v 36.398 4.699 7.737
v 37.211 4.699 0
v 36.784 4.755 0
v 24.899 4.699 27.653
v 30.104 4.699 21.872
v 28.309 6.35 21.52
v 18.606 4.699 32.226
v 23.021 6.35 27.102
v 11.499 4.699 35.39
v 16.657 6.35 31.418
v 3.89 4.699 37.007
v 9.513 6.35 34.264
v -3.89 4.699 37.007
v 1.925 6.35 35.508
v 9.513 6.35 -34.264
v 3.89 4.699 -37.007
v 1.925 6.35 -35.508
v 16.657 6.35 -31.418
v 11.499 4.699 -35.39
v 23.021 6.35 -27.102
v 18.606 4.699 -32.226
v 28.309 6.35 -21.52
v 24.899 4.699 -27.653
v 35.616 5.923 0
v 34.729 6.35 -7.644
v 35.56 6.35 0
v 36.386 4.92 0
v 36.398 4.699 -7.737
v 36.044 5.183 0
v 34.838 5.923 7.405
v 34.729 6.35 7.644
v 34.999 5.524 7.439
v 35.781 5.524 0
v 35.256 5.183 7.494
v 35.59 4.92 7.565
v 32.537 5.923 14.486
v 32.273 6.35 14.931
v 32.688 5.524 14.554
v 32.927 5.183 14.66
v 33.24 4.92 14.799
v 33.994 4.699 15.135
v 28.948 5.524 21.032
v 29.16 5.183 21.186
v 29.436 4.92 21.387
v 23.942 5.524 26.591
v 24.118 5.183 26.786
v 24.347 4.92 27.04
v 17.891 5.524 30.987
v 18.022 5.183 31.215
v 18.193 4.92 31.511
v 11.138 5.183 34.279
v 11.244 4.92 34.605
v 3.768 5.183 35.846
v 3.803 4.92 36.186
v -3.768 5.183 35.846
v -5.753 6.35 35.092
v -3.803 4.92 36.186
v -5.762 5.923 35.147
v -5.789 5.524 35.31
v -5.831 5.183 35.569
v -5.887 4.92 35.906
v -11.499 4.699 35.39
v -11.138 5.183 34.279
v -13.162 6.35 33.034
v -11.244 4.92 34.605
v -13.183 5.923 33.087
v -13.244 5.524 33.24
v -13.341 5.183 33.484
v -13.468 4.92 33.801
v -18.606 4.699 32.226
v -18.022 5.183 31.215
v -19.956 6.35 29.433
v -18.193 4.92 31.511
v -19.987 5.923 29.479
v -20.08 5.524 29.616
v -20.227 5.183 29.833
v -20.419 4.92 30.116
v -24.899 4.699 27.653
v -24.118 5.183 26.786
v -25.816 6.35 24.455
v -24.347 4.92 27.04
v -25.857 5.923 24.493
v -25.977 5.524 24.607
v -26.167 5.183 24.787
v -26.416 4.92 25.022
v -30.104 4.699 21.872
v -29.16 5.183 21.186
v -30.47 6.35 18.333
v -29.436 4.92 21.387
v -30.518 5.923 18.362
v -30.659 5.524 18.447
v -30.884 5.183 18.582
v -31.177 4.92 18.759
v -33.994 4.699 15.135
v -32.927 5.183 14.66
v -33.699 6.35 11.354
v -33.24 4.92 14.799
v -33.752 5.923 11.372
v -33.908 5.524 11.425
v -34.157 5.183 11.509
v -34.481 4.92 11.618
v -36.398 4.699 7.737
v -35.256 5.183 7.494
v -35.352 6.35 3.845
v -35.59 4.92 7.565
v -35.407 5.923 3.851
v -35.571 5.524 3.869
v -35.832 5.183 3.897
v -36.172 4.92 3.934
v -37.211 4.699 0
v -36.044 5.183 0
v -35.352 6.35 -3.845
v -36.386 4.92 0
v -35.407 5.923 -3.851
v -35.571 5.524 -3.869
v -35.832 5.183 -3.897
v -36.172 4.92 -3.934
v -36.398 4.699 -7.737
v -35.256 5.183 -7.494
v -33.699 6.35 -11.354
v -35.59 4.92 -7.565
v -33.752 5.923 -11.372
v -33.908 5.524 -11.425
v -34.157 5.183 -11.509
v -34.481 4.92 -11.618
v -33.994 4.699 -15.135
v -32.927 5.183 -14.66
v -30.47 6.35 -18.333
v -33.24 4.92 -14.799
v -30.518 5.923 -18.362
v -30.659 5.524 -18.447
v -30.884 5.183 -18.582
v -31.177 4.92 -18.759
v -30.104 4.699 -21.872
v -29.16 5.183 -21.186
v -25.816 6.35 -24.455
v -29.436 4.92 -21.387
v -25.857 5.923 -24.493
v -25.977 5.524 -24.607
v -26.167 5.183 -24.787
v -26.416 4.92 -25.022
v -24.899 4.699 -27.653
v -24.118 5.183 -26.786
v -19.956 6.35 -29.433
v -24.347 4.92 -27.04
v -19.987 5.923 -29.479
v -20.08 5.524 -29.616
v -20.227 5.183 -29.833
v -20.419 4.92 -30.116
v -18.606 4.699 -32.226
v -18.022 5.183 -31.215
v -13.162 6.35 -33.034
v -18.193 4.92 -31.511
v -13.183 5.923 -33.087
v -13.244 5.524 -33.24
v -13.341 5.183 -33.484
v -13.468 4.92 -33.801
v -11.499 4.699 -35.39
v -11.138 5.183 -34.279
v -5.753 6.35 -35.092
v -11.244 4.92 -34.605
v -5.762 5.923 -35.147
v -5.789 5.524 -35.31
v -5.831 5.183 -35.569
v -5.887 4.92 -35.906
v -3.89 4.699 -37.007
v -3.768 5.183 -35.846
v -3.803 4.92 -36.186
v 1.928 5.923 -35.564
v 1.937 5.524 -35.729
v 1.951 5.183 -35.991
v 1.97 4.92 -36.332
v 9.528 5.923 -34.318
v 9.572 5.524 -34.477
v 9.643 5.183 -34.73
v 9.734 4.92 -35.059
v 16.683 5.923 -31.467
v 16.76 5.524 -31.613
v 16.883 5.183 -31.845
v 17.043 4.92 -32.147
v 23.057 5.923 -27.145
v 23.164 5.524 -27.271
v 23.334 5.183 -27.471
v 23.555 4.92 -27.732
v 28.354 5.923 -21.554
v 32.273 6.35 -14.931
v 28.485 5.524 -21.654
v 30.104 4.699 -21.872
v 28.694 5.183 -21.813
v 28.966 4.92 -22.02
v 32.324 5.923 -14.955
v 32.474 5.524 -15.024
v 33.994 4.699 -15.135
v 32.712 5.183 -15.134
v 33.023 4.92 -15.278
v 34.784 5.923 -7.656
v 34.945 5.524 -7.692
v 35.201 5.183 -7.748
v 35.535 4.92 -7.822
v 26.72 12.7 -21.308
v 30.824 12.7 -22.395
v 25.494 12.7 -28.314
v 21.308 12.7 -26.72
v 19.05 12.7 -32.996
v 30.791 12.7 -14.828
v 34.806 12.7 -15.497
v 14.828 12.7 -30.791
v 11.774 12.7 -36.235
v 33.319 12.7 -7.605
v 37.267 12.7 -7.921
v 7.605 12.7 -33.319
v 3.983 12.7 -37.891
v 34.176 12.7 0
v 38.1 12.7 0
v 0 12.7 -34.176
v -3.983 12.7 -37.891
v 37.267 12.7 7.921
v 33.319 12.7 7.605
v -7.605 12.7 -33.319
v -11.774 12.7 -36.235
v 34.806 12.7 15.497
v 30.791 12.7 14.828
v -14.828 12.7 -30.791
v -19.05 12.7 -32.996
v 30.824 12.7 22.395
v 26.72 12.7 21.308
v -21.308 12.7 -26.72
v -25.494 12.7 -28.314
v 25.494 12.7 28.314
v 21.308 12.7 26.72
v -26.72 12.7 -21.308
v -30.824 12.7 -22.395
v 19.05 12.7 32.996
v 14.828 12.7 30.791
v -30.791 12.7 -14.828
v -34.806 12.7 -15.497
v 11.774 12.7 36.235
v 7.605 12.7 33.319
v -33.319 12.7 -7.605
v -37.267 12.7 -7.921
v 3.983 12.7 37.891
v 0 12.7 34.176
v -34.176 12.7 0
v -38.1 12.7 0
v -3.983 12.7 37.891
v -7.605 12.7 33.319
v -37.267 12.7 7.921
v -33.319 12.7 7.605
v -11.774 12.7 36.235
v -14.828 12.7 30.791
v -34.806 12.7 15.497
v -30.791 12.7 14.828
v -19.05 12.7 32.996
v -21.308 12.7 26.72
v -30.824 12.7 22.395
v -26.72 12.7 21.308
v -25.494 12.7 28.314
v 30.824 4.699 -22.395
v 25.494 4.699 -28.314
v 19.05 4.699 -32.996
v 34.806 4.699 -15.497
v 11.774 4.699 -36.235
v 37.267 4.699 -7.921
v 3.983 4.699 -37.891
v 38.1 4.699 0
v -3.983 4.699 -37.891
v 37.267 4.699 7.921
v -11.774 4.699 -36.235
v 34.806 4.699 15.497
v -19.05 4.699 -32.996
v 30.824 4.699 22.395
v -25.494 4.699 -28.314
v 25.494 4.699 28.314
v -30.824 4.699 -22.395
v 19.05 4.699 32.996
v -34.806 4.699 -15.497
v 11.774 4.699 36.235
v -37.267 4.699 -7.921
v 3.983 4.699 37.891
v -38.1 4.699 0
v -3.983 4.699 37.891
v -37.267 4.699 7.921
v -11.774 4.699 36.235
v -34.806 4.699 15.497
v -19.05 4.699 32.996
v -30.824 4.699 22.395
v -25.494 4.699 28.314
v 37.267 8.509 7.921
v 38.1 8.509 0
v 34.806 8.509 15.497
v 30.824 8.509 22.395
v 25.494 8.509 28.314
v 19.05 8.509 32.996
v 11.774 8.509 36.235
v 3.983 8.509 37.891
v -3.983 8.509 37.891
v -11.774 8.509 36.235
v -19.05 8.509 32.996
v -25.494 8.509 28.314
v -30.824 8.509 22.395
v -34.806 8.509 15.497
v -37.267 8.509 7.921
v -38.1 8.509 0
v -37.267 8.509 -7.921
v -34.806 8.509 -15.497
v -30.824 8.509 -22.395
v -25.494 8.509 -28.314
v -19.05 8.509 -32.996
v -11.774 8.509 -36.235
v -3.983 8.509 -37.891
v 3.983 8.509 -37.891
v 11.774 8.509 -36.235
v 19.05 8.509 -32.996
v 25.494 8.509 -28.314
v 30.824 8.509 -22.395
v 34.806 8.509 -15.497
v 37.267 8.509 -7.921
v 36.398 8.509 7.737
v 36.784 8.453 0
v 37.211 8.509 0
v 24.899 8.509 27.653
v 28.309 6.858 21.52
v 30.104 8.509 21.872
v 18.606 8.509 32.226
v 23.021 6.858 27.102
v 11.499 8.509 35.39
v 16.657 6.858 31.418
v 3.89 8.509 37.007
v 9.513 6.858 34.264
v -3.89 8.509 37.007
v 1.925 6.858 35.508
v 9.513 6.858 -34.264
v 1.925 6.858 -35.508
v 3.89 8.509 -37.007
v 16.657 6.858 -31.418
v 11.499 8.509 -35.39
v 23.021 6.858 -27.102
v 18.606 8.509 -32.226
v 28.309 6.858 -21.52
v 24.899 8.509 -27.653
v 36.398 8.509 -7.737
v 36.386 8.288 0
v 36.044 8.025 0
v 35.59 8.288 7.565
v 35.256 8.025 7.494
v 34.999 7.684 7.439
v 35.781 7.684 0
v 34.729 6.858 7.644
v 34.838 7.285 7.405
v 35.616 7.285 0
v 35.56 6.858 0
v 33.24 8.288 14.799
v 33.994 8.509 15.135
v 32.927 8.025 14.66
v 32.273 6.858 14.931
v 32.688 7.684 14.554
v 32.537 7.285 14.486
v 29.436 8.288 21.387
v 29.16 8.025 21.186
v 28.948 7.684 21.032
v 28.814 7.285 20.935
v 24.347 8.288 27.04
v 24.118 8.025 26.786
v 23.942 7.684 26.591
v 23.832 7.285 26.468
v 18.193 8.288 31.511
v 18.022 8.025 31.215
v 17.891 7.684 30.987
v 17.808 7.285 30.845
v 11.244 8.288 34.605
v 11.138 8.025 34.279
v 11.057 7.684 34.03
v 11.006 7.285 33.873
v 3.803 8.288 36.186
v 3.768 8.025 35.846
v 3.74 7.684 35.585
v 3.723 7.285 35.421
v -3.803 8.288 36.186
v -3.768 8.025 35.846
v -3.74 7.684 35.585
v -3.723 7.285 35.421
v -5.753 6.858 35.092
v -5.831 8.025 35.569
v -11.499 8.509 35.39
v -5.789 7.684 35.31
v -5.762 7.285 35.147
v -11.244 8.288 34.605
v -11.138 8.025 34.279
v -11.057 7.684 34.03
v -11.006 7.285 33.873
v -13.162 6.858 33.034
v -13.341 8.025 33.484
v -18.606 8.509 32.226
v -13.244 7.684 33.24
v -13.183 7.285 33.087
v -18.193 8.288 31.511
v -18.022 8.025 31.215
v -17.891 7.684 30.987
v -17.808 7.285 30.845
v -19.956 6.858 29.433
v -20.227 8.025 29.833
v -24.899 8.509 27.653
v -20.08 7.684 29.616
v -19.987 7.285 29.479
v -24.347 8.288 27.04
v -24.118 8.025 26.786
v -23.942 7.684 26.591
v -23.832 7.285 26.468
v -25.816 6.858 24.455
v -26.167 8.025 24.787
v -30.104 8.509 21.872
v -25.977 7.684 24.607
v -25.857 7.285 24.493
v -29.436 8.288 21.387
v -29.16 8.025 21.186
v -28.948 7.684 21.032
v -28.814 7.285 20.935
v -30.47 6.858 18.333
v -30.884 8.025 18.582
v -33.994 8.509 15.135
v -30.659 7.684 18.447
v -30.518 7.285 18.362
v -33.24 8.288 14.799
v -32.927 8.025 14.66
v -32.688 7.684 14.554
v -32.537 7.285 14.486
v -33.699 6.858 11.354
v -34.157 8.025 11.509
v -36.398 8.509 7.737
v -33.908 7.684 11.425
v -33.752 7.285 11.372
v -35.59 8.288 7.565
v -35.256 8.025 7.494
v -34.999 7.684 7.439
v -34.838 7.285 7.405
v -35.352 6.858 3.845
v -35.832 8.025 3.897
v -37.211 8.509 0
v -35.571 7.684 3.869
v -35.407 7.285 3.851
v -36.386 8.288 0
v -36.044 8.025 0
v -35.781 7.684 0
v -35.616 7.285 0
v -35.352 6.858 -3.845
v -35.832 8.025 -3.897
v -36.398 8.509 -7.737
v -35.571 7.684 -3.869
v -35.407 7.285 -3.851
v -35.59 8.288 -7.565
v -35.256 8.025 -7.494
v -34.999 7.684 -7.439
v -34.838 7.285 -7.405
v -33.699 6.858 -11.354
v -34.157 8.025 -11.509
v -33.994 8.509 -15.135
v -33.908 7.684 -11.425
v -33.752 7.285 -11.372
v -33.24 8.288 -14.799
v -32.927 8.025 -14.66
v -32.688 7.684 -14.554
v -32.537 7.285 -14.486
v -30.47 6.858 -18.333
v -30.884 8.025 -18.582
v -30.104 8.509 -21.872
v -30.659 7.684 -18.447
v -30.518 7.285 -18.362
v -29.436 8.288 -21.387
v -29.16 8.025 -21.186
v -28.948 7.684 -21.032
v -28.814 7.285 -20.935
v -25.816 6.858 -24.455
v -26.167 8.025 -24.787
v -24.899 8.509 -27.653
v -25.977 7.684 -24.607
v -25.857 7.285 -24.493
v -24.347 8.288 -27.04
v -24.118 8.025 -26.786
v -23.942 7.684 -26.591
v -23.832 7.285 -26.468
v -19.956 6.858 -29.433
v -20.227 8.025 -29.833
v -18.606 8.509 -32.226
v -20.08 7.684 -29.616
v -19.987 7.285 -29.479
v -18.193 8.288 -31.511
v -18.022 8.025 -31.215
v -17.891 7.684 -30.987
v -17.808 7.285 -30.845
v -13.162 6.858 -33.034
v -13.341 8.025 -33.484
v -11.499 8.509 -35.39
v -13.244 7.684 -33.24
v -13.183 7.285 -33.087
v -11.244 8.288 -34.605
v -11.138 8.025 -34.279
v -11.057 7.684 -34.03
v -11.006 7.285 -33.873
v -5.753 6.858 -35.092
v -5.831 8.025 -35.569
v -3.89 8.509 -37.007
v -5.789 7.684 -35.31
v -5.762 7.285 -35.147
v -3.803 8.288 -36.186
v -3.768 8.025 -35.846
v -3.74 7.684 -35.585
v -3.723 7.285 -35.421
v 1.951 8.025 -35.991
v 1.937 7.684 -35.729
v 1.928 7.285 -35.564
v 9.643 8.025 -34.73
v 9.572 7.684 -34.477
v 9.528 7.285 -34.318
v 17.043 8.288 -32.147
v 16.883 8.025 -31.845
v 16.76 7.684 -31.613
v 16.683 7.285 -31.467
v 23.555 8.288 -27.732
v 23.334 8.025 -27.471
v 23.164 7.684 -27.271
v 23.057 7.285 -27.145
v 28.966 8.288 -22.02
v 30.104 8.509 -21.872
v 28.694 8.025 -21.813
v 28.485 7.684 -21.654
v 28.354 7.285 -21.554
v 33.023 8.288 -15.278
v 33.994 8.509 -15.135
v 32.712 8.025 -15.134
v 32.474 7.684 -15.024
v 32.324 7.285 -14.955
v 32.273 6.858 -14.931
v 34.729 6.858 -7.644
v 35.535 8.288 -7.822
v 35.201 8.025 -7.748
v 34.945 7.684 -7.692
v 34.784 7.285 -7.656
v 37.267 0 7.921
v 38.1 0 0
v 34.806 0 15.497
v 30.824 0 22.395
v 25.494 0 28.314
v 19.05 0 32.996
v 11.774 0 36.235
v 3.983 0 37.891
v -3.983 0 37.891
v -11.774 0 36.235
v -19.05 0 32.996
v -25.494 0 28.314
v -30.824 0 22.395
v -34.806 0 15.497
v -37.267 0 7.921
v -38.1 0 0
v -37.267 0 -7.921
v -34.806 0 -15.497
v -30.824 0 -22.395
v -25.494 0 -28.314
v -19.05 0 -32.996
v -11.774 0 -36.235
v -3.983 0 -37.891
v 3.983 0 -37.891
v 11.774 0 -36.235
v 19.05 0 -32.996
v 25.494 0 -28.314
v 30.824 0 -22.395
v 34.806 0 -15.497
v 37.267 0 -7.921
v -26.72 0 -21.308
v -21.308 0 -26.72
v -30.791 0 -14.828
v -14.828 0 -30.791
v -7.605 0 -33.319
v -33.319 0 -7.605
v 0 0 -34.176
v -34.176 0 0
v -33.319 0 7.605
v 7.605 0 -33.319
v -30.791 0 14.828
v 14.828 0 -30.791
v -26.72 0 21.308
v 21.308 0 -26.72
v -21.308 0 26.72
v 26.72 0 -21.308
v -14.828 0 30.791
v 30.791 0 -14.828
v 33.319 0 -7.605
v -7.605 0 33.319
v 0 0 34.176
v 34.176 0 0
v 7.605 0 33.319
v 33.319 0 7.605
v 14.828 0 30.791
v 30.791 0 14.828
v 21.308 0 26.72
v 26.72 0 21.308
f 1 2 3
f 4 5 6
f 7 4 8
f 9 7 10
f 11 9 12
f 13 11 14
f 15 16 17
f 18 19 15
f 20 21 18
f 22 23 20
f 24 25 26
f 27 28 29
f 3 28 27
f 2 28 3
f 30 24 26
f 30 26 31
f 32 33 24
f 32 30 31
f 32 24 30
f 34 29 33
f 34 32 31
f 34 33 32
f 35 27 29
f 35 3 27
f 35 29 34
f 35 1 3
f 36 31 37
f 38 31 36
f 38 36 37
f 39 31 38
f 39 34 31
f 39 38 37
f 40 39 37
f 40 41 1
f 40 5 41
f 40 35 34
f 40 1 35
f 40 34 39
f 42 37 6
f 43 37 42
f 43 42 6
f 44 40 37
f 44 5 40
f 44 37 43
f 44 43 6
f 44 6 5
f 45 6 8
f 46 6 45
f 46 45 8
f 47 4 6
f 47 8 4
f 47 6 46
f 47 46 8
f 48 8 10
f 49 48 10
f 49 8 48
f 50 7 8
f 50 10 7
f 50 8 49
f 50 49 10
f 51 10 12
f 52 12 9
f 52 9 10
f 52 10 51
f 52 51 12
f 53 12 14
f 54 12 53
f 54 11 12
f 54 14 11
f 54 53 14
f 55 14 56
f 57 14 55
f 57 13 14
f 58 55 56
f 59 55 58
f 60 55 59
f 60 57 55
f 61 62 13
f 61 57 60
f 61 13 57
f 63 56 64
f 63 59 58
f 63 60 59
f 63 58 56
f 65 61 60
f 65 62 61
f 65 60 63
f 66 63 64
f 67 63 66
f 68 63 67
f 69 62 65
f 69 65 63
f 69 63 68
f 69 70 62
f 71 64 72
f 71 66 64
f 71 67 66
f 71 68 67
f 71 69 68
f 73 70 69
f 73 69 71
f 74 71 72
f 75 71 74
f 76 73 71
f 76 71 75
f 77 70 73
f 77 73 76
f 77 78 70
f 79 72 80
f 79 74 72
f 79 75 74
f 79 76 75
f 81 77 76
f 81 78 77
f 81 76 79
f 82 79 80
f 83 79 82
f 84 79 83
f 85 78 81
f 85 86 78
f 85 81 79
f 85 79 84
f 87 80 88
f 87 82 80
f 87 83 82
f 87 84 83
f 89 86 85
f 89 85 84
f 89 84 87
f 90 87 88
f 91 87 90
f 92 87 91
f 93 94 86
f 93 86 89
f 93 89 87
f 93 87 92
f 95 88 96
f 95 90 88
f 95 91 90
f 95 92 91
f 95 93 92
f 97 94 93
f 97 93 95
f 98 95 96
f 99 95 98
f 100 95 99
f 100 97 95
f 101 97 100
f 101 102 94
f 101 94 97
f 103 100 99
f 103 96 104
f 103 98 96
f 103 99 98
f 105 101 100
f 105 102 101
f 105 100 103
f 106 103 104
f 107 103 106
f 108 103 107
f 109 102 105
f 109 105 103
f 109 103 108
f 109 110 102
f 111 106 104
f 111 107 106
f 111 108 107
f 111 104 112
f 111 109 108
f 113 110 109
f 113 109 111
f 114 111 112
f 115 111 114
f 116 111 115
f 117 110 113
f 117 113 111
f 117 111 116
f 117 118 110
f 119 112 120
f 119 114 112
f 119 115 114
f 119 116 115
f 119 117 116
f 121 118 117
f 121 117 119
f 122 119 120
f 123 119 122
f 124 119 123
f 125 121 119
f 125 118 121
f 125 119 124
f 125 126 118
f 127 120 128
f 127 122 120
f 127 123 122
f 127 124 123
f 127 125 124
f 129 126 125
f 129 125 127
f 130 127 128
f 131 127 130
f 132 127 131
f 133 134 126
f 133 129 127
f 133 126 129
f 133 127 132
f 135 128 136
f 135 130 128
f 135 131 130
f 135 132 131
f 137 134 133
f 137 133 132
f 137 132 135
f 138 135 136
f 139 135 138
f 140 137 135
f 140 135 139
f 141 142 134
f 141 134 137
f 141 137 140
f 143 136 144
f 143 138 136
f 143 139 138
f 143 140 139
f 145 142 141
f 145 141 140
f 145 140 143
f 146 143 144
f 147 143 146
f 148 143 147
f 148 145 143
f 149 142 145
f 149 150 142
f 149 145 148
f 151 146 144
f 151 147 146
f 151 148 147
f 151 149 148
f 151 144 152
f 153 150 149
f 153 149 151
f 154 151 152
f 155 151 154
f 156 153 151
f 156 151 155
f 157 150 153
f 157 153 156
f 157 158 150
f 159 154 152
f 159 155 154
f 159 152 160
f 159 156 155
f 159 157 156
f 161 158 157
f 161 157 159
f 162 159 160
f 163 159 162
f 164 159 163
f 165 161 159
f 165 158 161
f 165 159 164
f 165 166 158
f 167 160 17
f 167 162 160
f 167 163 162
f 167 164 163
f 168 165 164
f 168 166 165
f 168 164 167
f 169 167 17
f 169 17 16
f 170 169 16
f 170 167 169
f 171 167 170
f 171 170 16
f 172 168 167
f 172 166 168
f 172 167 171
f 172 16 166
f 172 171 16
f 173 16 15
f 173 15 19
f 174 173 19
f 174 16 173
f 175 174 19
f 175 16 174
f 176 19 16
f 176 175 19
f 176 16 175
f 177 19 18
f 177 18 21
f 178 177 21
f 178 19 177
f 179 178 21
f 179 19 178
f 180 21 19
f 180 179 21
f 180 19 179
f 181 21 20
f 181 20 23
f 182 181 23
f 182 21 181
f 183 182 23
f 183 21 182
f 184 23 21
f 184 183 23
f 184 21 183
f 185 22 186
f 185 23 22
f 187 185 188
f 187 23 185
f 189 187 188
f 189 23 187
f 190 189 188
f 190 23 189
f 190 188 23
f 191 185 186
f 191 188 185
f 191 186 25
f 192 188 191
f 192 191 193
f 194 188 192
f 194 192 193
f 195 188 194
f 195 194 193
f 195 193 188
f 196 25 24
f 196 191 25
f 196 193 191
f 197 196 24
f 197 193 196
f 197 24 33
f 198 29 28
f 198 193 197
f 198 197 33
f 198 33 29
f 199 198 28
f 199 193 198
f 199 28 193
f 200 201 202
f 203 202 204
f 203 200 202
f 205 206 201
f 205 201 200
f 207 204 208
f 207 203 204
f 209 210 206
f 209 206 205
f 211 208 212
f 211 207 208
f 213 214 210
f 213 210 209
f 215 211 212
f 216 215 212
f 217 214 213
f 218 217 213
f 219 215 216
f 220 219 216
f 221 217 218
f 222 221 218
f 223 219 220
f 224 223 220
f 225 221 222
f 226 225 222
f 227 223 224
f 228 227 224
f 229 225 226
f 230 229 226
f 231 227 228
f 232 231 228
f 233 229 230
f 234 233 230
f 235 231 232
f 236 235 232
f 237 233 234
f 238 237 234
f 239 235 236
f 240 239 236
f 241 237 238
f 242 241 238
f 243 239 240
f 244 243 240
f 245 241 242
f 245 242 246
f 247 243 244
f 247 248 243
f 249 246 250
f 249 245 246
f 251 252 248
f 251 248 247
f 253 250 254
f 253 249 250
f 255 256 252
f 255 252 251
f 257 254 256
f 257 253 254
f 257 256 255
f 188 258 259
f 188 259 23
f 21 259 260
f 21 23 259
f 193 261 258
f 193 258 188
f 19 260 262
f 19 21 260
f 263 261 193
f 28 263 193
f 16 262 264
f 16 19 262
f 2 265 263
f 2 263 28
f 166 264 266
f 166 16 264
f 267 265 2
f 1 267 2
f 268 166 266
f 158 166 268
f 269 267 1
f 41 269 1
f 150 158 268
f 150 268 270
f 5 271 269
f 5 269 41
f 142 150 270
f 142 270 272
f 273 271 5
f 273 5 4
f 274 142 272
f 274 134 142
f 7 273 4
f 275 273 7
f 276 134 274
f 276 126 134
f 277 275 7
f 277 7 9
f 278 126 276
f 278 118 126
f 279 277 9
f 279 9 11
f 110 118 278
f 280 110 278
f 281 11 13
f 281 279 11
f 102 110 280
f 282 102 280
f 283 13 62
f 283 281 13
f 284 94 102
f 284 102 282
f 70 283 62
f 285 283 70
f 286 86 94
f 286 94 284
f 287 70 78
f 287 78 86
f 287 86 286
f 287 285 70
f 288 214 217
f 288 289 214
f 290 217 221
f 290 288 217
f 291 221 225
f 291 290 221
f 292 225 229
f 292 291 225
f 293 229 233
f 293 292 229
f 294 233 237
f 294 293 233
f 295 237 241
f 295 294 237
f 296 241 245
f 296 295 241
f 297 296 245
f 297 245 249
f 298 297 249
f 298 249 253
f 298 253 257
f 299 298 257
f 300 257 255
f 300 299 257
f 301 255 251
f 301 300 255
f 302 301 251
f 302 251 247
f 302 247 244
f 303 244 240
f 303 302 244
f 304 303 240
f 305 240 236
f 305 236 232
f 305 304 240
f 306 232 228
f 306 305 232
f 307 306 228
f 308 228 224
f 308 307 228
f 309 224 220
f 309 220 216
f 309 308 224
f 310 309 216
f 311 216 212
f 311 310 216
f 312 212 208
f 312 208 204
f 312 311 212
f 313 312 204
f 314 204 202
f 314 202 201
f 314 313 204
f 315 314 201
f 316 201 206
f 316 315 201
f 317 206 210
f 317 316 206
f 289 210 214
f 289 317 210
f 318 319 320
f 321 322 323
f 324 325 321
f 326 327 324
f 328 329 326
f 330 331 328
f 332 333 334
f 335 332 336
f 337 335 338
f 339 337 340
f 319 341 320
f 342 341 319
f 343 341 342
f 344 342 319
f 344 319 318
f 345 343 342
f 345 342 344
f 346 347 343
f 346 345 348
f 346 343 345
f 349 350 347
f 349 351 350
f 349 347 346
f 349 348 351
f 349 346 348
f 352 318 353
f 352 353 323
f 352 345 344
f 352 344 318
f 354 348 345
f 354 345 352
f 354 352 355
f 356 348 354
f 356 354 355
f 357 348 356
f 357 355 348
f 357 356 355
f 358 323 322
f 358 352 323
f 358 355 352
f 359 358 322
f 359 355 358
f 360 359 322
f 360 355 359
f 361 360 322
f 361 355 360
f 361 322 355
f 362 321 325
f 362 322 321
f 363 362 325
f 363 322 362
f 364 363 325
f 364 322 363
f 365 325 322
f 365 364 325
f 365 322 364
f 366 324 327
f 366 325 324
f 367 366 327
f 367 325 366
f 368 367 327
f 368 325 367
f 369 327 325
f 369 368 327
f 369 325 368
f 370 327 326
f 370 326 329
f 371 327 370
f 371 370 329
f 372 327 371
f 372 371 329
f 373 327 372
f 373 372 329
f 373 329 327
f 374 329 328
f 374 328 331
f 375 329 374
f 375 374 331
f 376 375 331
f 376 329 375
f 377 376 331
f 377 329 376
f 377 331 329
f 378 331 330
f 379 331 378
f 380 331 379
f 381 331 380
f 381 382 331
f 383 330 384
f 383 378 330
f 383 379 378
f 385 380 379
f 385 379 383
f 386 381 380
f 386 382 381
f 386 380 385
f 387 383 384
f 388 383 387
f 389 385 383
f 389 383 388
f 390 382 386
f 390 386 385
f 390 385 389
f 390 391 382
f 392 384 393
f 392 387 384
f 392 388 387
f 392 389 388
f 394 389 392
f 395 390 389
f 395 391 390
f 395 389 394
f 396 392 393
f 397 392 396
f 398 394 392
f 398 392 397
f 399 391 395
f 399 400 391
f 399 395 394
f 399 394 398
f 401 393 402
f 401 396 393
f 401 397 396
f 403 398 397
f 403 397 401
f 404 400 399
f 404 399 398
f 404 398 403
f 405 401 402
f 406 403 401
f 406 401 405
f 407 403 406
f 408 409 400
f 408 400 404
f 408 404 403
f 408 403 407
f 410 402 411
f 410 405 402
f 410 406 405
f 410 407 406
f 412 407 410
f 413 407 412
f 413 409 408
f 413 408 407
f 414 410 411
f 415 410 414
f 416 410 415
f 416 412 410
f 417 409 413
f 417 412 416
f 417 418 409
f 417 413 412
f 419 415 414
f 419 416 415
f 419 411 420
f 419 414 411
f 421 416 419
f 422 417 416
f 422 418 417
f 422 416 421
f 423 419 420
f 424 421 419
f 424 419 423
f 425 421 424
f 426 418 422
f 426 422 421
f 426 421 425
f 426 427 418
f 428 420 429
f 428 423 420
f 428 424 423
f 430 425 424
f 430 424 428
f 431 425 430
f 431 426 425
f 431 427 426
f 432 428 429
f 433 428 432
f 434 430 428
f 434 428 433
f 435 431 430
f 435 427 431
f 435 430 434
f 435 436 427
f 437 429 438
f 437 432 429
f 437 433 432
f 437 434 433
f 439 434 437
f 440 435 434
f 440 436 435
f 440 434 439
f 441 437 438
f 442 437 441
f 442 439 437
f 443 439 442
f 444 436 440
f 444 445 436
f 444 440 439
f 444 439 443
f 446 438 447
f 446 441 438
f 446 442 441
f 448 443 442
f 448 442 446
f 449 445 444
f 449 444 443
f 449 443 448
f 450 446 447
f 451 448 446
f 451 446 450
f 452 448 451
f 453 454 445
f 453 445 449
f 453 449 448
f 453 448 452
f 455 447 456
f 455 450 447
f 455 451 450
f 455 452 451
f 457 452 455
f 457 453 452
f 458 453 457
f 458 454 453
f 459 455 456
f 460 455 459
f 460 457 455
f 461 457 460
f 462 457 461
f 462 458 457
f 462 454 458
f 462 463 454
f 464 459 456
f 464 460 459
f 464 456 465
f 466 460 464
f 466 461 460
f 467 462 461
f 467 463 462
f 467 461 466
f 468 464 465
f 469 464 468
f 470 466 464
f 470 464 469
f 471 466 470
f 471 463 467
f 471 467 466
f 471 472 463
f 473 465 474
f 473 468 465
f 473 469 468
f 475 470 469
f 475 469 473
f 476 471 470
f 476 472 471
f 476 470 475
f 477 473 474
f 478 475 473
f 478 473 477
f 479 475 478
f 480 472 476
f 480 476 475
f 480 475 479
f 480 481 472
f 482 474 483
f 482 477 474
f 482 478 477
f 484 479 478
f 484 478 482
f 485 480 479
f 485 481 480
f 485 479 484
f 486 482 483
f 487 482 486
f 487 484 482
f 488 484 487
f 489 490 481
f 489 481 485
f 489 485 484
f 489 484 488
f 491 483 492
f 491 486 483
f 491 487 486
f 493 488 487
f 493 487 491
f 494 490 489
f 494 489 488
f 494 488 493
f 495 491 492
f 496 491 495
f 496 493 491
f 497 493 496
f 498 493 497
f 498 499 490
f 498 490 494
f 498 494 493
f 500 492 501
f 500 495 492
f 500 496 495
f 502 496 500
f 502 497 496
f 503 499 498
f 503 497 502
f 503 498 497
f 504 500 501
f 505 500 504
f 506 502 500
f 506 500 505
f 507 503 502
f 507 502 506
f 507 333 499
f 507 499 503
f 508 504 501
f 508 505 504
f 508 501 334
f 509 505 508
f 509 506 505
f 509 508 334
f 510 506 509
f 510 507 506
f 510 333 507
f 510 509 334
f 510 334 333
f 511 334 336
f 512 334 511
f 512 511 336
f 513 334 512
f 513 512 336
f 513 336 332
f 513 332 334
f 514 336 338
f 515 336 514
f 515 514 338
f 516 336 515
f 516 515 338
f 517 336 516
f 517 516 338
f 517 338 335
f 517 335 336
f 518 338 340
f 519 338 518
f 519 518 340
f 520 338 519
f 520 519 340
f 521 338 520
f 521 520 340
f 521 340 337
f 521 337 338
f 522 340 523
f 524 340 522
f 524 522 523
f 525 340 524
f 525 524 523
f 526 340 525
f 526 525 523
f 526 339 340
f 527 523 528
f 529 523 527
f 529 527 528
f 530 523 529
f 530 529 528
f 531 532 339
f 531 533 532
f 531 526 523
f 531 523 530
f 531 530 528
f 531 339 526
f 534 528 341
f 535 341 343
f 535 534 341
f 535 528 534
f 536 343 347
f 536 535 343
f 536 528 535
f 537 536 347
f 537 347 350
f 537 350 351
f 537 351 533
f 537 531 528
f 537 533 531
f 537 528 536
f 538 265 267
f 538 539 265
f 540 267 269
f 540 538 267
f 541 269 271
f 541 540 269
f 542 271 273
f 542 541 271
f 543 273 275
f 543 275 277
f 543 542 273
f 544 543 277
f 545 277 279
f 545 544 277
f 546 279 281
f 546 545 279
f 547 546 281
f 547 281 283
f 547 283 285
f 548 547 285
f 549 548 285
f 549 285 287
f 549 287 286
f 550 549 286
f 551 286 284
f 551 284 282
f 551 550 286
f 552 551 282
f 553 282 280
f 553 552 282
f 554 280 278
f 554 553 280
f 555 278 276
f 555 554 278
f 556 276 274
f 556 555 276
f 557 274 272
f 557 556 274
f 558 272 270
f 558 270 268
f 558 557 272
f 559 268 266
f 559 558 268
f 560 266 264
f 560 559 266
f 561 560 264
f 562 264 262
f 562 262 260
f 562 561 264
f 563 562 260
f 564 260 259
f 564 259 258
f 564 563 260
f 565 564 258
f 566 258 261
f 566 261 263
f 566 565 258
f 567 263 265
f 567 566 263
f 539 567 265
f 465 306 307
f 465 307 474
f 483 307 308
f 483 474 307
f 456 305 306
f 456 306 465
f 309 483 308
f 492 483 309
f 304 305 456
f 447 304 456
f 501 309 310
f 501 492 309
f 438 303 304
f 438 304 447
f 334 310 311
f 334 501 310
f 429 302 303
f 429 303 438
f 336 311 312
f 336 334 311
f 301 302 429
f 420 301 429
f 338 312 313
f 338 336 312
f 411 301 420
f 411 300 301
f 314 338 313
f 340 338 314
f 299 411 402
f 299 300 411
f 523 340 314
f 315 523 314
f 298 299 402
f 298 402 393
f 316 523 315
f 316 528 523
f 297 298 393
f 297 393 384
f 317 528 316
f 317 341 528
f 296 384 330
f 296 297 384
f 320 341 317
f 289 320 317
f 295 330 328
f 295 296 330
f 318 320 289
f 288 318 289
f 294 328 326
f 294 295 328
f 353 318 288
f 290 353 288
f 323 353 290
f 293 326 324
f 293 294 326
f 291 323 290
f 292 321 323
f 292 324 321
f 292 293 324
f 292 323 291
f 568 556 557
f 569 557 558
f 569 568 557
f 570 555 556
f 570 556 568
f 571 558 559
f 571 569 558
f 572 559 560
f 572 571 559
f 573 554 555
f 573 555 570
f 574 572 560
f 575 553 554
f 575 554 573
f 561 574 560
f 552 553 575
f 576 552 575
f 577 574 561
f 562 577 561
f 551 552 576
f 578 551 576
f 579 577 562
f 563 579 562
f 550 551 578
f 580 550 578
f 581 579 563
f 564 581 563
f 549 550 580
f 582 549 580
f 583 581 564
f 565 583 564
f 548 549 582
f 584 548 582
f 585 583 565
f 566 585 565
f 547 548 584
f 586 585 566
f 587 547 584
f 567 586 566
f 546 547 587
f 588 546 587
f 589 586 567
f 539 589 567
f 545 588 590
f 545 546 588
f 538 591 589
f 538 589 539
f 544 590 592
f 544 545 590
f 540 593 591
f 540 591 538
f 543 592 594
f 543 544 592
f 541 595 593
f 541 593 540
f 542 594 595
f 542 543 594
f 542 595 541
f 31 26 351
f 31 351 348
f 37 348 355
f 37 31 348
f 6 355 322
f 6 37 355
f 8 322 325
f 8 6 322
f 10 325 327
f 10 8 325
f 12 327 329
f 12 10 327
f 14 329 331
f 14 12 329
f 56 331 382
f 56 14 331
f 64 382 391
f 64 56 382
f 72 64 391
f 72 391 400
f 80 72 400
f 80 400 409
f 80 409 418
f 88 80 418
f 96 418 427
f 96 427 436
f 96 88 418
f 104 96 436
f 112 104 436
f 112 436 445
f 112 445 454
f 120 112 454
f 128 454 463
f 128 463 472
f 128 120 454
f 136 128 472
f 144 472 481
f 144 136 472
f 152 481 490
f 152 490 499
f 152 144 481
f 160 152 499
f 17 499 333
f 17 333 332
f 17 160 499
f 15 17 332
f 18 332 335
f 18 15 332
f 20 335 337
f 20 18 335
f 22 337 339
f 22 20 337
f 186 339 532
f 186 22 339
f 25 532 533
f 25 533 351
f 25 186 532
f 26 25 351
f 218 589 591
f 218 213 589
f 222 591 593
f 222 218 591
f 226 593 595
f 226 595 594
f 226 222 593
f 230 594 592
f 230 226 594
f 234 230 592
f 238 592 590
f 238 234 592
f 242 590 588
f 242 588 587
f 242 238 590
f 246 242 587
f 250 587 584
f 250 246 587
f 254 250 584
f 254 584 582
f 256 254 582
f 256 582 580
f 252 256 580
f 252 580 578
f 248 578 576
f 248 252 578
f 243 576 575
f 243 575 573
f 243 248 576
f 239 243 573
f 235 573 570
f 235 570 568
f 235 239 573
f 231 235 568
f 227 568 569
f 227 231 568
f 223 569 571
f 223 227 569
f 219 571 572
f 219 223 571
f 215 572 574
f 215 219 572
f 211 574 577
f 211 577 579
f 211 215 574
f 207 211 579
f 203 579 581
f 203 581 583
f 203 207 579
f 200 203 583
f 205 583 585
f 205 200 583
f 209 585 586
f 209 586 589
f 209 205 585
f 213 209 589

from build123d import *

# Parameters (mm, degrees)
FILLET1_R = 1.651


with BuildPart() as part:
    # Sketch1 → Revolve1 (revolve)
    with BuildSketch(Plane.XY):
        Polygon((34.1757, 0), (34.1757, 12.7), (38.1, 12.7), (38.1, 8.509), (35.56, 8.509), (35.56, 4.699), (38.1, 4.699), (38.1, 0), align=None)
    revolve(axis=Axis((0, 13.335, 0), (0, -1, 0)))

    # Fillet1
    fillet1_edges = [part.edges().sort_by_distance(p)[0] for p in [
        (-35.56, 4.699, 0),
        (-35.56, 8.509, 0),
    ]]
    fillet(fillet1_edges, radius=FILLET1_R)


solid = part.part
